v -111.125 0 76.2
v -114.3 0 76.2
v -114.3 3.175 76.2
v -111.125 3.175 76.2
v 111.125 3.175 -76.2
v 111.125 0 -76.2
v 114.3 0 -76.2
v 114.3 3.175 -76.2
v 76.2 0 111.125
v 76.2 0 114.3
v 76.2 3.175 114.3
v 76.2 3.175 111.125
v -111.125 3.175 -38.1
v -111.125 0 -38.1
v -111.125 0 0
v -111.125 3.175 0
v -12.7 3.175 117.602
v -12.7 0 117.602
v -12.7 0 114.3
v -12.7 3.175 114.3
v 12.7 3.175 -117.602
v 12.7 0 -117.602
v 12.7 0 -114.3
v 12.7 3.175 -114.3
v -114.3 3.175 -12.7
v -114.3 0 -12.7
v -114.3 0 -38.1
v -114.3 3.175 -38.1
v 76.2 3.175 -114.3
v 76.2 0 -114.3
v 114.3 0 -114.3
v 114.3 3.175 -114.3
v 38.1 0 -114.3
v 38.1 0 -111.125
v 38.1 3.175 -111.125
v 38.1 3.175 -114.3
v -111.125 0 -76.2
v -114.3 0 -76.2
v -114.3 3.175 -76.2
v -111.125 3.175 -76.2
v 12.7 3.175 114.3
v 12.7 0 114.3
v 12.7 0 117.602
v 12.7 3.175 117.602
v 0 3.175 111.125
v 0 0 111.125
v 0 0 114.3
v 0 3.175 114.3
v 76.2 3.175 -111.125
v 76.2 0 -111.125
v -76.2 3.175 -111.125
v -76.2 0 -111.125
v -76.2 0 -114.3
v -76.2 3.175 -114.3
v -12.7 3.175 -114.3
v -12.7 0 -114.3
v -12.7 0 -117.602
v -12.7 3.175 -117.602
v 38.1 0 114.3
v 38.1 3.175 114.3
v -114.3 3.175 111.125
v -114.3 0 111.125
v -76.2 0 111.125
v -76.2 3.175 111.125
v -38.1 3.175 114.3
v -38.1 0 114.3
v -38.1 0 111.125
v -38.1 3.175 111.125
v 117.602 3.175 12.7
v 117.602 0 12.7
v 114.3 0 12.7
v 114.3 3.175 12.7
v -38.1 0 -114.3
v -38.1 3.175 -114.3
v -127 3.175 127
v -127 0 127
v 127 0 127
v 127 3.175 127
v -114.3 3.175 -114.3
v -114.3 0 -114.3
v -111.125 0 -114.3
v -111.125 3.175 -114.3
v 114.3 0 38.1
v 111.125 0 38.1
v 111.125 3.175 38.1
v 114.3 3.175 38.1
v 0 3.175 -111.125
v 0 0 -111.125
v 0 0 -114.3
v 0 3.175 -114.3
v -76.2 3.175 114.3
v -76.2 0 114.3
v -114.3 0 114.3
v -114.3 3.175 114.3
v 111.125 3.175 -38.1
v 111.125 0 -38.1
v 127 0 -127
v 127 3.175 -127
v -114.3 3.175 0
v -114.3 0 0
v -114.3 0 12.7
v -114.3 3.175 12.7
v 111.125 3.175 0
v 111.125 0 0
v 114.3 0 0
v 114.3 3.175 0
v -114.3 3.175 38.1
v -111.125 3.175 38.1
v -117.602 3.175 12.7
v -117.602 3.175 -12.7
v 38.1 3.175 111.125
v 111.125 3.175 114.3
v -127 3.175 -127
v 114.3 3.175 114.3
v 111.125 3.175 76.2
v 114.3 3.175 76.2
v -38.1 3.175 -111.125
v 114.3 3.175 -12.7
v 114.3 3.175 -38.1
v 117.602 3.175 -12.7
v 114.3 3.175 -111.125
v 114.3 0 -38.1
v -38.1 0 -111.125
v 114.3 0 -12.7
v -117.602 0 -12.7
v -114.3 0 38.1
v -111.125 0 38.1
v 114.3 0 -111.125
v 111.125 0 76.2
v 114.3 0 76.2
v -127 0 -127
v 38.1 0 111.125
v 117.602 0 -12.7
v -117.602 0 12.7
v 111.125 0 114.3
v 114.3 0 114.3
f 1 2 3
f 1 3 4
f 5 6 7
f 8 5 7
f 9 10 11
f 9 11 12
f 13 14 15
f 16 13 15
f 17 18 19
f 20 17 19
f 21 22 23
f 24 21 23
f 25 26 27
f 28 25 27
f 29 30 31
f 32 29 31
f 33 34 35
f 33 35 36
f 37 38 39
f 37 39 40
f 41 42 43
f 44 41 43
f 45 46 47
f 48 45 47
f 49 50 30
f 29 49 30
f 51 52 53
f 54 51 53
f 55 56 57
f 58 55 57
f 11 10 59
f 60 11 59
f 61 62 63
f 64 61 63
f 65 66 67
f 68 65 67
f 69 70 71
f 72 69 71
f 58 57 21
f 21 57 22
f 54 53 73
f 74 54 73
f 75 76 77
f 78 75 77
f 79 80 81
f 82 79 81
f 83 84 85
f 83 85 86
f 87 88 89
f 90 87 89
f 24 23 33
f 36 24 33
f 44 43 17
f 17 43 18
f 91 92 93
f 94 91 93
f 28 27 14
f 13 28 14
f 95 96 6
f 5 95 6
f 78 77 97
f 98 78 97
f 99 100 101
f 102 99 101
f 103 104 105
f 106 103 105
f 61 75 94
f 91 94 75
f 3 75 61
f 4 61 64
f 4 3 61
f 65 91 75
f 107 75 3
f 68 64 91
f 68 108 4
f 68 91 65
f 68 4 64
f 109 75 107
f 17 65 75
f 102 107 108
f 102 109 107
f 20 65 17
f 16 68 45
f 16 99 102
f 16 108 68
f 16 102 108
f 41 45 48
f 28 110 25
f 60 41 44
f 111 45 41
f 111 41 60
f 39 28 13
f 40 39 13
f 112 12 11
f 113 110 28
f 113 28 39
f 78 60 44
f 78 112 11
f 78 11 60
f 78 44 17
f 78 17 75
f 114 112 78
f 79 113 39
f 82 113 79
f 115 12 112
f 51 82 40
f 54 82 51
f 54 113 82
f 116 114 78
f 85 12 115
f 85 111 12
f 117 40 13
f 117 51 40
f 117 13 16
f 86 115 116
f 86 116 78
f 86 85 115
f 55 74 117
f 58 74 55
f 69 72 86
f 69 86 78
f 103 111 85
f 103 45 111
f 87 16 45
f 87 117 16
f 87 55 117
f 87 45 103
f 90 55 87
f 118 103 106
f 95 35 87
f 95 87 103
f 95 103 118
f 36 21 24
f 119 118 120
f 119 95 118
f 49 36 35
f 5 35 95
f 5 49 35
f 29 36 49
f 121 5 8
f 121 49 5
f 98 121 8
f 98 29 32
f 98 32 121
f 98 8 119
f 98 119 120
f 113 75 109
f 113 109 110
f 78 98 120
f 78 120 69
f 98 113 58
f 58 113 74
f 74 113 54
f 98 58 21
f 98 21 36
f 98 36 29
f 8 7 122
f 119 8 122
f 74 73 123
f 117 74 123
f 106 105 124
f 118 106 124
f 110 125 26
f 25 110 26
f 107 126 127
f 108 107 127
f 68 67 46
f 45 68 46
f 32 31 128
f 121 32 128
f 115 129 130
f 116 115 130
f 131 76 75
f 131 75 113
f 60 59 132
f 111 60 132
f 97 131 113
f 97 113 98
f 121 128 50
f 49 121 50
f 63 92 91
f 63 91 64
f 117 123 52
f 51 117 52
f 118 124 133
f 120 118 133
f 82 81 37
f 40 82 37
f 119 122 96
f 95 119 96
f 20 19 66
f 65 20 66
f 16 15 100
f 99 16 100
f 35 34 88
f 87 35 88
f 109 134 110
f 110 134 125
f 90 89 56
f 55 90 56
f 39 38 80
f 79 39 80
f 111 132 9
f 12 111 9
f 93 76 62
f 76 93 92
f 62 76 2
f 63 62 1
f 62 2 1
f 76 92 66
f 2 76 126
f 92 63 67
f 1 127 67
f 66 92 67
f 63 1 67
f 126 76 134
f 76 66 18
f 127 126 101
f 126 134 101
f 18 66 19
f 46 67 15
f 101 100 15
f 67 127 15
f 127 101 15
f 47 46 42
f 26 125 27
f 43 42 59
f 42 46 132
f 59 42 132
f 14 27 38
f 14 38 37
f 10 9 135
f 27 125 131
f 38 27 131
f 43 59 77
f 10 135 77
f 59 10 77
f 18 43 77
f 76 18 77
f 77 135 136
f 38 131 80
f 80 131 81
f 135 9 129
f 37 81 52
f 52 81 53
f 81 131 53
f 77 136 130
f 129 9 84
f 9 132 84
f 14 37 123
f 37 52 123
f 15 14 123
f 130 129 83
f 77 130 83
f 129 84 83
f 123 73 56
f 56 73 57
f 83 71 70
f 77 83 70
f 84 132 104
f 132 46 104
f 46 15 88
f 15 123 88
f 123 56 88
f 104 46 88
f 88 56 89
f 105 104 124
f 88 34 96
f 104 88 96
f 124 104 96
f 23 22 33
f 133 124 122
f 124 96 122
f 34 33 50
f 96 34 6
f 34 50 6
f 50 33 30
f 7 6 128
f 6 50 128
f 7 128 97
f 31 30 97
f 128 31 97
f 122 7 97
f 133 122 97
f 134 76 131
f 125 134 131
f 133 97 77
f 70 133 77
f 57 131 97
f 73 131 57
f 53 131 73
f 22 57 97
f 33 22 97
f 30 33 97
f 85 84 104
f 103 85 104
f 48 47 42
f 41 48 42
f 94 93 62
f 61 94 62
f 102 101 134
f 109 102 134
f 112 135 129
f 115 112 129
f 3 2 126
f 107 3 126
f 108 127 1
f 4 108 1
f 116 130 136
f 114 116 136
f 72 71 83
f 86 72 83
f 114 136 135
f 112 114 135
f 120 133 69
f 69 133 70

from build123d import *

# Parameters (mm, degrees)
SKETCH1_W           = 254
SKETCH1_H           = 254
SKETCH1_W_2         = 3.175
SKETCH1_H_2         = 38.1
SKETCH1_H_3         = 34.925
SKETCH1_W_3         = 38.1
SKETCH1_H_4         = 3.175
SKETCH1_W_4         = 34.925
BOSS_EXTRUDE1_DEPTH = 3.175


with BuildPart() as part:
    # Sketch1 → Boss-Extrude1 (new body)
    with BuildSketch(Plane(origin=(0, 0, 0), x_dir=(1, 0, 0), z_dir=(0, 1, 0))):
        Rectangle(SKETCH1_W, SKETCH1_H)
        Polygon((-111.125, 114.3), (-76.2, 114.3), (-38.1, 114.3), (-12.7, 114.3), (-12.7, 117.602), (12.7, 117.602), (12.7, 114.3), (38.1, 114.3), (76.2, 114.3), (111.125, 114.3), (114.3, 114.3), (114.3, 111.125), (114.3, 76.2), (114.3, 38.1), (114.3, 12.7), (117.602, 12.7), (117.602, -12.7), (114.3, -12.7), (114.3, -38.1), (114.3, -76.2), (114.3, -111.125), (114.3, -114.3), (111.125, -114.3), (76.2, -114.3), (38.1, -114.3), (12.7, -114.3), (12.7, -117.602), (-12.7, -117.602), (-12.7, -114.3), (-38.1, -114.3), (-76.2, -114.3), (-111.125, -114.3), (-114.3, -114.3), (-114.3, -111.125), (-114.3, -76.2), (-114.3, -38.1), (-114.3, -12.7), (-117.602, -12.7), (-117.602, 12.7), (-114.3, 12.7), (-114.3, 38.1), (-114.3, 76.2), (-114.3, 111.125), (-114.3, 114.3), align=None, mode=Mode.SUBTRACT)
        Polygon((-38.1, 111.125), (-76.2, 111.125), (-111.125, 111.125), (-111.125, 76.2), (-111.125, 38.1), (-111.125, 0), (-111.125, -38.1), (-111.125, -76.2), (-111.125, -111.125), (-76.2, -111.125), (-38.1, -111.125), (0, -111.125), (38.1, -111.125), (76.2, -111.125), (111.125, -111.125), (111.125, -76.2), (111.125, -38.1), (111.125, 0), (111.125, 38.1), (111.125, 76.2), (111.125, 111.125), (76.2, 111.125), (38.1, 111.125), (0, 111.125), align=None)
        with Locations((-112.7125, 57.15)):
            Rectangle(SKETCH1_W_2, SKETCH1_H_2)
        Polygon((-111.125, -38.1), (-111.125, 0), (-114.3, 0), (-114.3, -12.7), (-114.3, -38.1), align=None)
        with Locations((-112.7125, -93.6625)):
            Rectangle(SKETCH1_W_2, SKETCH1_H_3)
        with Locations((-57.15, -112.7125)):
            Rectangle(SKETCH1_W_3, SKETCH1_H_4)
        Polygon((38.1, -111.125), (0, -111.125), (0, -114.3), (12.7, -114.3), (38.1, -114.3), align=None)
        with Locations((93.6625, -112.7125)):
            Rectangle(SKETCH1_W_4, SKETCH1_H_4)
        with Locations((112.7125, -57.15)):
            Rectangle(SKETCH1_W_2, SKETCH1_H_2)
        Polygon((114.3, 38.1), (111.125, 38.1), (111.125, 0), (114.3, 0), (114.3, 12.7), align=None)
        with Locations((112.7125, 93.6625)):
            Rectangle(SKETCH1_W_2, SKETCH1_H_3)
        with Locations((57.15, 112.7125)):
            Rectangle(SKETCH1_W_3, SKETCH1_H_4)
        Polygon((-12.7, 114.3), (-38.1, 114.3), (-38.1, 111.125), (0, 111.125), (0, 114.3), align=None)
        with Locations((-93.6625, 112.7125)):
            Rectangle(SKETCH1_W_4, SKETCH1_H_4)
    extrude(amount=BOSS_EXTRUDE1_DEPTH)


solid = part.part
